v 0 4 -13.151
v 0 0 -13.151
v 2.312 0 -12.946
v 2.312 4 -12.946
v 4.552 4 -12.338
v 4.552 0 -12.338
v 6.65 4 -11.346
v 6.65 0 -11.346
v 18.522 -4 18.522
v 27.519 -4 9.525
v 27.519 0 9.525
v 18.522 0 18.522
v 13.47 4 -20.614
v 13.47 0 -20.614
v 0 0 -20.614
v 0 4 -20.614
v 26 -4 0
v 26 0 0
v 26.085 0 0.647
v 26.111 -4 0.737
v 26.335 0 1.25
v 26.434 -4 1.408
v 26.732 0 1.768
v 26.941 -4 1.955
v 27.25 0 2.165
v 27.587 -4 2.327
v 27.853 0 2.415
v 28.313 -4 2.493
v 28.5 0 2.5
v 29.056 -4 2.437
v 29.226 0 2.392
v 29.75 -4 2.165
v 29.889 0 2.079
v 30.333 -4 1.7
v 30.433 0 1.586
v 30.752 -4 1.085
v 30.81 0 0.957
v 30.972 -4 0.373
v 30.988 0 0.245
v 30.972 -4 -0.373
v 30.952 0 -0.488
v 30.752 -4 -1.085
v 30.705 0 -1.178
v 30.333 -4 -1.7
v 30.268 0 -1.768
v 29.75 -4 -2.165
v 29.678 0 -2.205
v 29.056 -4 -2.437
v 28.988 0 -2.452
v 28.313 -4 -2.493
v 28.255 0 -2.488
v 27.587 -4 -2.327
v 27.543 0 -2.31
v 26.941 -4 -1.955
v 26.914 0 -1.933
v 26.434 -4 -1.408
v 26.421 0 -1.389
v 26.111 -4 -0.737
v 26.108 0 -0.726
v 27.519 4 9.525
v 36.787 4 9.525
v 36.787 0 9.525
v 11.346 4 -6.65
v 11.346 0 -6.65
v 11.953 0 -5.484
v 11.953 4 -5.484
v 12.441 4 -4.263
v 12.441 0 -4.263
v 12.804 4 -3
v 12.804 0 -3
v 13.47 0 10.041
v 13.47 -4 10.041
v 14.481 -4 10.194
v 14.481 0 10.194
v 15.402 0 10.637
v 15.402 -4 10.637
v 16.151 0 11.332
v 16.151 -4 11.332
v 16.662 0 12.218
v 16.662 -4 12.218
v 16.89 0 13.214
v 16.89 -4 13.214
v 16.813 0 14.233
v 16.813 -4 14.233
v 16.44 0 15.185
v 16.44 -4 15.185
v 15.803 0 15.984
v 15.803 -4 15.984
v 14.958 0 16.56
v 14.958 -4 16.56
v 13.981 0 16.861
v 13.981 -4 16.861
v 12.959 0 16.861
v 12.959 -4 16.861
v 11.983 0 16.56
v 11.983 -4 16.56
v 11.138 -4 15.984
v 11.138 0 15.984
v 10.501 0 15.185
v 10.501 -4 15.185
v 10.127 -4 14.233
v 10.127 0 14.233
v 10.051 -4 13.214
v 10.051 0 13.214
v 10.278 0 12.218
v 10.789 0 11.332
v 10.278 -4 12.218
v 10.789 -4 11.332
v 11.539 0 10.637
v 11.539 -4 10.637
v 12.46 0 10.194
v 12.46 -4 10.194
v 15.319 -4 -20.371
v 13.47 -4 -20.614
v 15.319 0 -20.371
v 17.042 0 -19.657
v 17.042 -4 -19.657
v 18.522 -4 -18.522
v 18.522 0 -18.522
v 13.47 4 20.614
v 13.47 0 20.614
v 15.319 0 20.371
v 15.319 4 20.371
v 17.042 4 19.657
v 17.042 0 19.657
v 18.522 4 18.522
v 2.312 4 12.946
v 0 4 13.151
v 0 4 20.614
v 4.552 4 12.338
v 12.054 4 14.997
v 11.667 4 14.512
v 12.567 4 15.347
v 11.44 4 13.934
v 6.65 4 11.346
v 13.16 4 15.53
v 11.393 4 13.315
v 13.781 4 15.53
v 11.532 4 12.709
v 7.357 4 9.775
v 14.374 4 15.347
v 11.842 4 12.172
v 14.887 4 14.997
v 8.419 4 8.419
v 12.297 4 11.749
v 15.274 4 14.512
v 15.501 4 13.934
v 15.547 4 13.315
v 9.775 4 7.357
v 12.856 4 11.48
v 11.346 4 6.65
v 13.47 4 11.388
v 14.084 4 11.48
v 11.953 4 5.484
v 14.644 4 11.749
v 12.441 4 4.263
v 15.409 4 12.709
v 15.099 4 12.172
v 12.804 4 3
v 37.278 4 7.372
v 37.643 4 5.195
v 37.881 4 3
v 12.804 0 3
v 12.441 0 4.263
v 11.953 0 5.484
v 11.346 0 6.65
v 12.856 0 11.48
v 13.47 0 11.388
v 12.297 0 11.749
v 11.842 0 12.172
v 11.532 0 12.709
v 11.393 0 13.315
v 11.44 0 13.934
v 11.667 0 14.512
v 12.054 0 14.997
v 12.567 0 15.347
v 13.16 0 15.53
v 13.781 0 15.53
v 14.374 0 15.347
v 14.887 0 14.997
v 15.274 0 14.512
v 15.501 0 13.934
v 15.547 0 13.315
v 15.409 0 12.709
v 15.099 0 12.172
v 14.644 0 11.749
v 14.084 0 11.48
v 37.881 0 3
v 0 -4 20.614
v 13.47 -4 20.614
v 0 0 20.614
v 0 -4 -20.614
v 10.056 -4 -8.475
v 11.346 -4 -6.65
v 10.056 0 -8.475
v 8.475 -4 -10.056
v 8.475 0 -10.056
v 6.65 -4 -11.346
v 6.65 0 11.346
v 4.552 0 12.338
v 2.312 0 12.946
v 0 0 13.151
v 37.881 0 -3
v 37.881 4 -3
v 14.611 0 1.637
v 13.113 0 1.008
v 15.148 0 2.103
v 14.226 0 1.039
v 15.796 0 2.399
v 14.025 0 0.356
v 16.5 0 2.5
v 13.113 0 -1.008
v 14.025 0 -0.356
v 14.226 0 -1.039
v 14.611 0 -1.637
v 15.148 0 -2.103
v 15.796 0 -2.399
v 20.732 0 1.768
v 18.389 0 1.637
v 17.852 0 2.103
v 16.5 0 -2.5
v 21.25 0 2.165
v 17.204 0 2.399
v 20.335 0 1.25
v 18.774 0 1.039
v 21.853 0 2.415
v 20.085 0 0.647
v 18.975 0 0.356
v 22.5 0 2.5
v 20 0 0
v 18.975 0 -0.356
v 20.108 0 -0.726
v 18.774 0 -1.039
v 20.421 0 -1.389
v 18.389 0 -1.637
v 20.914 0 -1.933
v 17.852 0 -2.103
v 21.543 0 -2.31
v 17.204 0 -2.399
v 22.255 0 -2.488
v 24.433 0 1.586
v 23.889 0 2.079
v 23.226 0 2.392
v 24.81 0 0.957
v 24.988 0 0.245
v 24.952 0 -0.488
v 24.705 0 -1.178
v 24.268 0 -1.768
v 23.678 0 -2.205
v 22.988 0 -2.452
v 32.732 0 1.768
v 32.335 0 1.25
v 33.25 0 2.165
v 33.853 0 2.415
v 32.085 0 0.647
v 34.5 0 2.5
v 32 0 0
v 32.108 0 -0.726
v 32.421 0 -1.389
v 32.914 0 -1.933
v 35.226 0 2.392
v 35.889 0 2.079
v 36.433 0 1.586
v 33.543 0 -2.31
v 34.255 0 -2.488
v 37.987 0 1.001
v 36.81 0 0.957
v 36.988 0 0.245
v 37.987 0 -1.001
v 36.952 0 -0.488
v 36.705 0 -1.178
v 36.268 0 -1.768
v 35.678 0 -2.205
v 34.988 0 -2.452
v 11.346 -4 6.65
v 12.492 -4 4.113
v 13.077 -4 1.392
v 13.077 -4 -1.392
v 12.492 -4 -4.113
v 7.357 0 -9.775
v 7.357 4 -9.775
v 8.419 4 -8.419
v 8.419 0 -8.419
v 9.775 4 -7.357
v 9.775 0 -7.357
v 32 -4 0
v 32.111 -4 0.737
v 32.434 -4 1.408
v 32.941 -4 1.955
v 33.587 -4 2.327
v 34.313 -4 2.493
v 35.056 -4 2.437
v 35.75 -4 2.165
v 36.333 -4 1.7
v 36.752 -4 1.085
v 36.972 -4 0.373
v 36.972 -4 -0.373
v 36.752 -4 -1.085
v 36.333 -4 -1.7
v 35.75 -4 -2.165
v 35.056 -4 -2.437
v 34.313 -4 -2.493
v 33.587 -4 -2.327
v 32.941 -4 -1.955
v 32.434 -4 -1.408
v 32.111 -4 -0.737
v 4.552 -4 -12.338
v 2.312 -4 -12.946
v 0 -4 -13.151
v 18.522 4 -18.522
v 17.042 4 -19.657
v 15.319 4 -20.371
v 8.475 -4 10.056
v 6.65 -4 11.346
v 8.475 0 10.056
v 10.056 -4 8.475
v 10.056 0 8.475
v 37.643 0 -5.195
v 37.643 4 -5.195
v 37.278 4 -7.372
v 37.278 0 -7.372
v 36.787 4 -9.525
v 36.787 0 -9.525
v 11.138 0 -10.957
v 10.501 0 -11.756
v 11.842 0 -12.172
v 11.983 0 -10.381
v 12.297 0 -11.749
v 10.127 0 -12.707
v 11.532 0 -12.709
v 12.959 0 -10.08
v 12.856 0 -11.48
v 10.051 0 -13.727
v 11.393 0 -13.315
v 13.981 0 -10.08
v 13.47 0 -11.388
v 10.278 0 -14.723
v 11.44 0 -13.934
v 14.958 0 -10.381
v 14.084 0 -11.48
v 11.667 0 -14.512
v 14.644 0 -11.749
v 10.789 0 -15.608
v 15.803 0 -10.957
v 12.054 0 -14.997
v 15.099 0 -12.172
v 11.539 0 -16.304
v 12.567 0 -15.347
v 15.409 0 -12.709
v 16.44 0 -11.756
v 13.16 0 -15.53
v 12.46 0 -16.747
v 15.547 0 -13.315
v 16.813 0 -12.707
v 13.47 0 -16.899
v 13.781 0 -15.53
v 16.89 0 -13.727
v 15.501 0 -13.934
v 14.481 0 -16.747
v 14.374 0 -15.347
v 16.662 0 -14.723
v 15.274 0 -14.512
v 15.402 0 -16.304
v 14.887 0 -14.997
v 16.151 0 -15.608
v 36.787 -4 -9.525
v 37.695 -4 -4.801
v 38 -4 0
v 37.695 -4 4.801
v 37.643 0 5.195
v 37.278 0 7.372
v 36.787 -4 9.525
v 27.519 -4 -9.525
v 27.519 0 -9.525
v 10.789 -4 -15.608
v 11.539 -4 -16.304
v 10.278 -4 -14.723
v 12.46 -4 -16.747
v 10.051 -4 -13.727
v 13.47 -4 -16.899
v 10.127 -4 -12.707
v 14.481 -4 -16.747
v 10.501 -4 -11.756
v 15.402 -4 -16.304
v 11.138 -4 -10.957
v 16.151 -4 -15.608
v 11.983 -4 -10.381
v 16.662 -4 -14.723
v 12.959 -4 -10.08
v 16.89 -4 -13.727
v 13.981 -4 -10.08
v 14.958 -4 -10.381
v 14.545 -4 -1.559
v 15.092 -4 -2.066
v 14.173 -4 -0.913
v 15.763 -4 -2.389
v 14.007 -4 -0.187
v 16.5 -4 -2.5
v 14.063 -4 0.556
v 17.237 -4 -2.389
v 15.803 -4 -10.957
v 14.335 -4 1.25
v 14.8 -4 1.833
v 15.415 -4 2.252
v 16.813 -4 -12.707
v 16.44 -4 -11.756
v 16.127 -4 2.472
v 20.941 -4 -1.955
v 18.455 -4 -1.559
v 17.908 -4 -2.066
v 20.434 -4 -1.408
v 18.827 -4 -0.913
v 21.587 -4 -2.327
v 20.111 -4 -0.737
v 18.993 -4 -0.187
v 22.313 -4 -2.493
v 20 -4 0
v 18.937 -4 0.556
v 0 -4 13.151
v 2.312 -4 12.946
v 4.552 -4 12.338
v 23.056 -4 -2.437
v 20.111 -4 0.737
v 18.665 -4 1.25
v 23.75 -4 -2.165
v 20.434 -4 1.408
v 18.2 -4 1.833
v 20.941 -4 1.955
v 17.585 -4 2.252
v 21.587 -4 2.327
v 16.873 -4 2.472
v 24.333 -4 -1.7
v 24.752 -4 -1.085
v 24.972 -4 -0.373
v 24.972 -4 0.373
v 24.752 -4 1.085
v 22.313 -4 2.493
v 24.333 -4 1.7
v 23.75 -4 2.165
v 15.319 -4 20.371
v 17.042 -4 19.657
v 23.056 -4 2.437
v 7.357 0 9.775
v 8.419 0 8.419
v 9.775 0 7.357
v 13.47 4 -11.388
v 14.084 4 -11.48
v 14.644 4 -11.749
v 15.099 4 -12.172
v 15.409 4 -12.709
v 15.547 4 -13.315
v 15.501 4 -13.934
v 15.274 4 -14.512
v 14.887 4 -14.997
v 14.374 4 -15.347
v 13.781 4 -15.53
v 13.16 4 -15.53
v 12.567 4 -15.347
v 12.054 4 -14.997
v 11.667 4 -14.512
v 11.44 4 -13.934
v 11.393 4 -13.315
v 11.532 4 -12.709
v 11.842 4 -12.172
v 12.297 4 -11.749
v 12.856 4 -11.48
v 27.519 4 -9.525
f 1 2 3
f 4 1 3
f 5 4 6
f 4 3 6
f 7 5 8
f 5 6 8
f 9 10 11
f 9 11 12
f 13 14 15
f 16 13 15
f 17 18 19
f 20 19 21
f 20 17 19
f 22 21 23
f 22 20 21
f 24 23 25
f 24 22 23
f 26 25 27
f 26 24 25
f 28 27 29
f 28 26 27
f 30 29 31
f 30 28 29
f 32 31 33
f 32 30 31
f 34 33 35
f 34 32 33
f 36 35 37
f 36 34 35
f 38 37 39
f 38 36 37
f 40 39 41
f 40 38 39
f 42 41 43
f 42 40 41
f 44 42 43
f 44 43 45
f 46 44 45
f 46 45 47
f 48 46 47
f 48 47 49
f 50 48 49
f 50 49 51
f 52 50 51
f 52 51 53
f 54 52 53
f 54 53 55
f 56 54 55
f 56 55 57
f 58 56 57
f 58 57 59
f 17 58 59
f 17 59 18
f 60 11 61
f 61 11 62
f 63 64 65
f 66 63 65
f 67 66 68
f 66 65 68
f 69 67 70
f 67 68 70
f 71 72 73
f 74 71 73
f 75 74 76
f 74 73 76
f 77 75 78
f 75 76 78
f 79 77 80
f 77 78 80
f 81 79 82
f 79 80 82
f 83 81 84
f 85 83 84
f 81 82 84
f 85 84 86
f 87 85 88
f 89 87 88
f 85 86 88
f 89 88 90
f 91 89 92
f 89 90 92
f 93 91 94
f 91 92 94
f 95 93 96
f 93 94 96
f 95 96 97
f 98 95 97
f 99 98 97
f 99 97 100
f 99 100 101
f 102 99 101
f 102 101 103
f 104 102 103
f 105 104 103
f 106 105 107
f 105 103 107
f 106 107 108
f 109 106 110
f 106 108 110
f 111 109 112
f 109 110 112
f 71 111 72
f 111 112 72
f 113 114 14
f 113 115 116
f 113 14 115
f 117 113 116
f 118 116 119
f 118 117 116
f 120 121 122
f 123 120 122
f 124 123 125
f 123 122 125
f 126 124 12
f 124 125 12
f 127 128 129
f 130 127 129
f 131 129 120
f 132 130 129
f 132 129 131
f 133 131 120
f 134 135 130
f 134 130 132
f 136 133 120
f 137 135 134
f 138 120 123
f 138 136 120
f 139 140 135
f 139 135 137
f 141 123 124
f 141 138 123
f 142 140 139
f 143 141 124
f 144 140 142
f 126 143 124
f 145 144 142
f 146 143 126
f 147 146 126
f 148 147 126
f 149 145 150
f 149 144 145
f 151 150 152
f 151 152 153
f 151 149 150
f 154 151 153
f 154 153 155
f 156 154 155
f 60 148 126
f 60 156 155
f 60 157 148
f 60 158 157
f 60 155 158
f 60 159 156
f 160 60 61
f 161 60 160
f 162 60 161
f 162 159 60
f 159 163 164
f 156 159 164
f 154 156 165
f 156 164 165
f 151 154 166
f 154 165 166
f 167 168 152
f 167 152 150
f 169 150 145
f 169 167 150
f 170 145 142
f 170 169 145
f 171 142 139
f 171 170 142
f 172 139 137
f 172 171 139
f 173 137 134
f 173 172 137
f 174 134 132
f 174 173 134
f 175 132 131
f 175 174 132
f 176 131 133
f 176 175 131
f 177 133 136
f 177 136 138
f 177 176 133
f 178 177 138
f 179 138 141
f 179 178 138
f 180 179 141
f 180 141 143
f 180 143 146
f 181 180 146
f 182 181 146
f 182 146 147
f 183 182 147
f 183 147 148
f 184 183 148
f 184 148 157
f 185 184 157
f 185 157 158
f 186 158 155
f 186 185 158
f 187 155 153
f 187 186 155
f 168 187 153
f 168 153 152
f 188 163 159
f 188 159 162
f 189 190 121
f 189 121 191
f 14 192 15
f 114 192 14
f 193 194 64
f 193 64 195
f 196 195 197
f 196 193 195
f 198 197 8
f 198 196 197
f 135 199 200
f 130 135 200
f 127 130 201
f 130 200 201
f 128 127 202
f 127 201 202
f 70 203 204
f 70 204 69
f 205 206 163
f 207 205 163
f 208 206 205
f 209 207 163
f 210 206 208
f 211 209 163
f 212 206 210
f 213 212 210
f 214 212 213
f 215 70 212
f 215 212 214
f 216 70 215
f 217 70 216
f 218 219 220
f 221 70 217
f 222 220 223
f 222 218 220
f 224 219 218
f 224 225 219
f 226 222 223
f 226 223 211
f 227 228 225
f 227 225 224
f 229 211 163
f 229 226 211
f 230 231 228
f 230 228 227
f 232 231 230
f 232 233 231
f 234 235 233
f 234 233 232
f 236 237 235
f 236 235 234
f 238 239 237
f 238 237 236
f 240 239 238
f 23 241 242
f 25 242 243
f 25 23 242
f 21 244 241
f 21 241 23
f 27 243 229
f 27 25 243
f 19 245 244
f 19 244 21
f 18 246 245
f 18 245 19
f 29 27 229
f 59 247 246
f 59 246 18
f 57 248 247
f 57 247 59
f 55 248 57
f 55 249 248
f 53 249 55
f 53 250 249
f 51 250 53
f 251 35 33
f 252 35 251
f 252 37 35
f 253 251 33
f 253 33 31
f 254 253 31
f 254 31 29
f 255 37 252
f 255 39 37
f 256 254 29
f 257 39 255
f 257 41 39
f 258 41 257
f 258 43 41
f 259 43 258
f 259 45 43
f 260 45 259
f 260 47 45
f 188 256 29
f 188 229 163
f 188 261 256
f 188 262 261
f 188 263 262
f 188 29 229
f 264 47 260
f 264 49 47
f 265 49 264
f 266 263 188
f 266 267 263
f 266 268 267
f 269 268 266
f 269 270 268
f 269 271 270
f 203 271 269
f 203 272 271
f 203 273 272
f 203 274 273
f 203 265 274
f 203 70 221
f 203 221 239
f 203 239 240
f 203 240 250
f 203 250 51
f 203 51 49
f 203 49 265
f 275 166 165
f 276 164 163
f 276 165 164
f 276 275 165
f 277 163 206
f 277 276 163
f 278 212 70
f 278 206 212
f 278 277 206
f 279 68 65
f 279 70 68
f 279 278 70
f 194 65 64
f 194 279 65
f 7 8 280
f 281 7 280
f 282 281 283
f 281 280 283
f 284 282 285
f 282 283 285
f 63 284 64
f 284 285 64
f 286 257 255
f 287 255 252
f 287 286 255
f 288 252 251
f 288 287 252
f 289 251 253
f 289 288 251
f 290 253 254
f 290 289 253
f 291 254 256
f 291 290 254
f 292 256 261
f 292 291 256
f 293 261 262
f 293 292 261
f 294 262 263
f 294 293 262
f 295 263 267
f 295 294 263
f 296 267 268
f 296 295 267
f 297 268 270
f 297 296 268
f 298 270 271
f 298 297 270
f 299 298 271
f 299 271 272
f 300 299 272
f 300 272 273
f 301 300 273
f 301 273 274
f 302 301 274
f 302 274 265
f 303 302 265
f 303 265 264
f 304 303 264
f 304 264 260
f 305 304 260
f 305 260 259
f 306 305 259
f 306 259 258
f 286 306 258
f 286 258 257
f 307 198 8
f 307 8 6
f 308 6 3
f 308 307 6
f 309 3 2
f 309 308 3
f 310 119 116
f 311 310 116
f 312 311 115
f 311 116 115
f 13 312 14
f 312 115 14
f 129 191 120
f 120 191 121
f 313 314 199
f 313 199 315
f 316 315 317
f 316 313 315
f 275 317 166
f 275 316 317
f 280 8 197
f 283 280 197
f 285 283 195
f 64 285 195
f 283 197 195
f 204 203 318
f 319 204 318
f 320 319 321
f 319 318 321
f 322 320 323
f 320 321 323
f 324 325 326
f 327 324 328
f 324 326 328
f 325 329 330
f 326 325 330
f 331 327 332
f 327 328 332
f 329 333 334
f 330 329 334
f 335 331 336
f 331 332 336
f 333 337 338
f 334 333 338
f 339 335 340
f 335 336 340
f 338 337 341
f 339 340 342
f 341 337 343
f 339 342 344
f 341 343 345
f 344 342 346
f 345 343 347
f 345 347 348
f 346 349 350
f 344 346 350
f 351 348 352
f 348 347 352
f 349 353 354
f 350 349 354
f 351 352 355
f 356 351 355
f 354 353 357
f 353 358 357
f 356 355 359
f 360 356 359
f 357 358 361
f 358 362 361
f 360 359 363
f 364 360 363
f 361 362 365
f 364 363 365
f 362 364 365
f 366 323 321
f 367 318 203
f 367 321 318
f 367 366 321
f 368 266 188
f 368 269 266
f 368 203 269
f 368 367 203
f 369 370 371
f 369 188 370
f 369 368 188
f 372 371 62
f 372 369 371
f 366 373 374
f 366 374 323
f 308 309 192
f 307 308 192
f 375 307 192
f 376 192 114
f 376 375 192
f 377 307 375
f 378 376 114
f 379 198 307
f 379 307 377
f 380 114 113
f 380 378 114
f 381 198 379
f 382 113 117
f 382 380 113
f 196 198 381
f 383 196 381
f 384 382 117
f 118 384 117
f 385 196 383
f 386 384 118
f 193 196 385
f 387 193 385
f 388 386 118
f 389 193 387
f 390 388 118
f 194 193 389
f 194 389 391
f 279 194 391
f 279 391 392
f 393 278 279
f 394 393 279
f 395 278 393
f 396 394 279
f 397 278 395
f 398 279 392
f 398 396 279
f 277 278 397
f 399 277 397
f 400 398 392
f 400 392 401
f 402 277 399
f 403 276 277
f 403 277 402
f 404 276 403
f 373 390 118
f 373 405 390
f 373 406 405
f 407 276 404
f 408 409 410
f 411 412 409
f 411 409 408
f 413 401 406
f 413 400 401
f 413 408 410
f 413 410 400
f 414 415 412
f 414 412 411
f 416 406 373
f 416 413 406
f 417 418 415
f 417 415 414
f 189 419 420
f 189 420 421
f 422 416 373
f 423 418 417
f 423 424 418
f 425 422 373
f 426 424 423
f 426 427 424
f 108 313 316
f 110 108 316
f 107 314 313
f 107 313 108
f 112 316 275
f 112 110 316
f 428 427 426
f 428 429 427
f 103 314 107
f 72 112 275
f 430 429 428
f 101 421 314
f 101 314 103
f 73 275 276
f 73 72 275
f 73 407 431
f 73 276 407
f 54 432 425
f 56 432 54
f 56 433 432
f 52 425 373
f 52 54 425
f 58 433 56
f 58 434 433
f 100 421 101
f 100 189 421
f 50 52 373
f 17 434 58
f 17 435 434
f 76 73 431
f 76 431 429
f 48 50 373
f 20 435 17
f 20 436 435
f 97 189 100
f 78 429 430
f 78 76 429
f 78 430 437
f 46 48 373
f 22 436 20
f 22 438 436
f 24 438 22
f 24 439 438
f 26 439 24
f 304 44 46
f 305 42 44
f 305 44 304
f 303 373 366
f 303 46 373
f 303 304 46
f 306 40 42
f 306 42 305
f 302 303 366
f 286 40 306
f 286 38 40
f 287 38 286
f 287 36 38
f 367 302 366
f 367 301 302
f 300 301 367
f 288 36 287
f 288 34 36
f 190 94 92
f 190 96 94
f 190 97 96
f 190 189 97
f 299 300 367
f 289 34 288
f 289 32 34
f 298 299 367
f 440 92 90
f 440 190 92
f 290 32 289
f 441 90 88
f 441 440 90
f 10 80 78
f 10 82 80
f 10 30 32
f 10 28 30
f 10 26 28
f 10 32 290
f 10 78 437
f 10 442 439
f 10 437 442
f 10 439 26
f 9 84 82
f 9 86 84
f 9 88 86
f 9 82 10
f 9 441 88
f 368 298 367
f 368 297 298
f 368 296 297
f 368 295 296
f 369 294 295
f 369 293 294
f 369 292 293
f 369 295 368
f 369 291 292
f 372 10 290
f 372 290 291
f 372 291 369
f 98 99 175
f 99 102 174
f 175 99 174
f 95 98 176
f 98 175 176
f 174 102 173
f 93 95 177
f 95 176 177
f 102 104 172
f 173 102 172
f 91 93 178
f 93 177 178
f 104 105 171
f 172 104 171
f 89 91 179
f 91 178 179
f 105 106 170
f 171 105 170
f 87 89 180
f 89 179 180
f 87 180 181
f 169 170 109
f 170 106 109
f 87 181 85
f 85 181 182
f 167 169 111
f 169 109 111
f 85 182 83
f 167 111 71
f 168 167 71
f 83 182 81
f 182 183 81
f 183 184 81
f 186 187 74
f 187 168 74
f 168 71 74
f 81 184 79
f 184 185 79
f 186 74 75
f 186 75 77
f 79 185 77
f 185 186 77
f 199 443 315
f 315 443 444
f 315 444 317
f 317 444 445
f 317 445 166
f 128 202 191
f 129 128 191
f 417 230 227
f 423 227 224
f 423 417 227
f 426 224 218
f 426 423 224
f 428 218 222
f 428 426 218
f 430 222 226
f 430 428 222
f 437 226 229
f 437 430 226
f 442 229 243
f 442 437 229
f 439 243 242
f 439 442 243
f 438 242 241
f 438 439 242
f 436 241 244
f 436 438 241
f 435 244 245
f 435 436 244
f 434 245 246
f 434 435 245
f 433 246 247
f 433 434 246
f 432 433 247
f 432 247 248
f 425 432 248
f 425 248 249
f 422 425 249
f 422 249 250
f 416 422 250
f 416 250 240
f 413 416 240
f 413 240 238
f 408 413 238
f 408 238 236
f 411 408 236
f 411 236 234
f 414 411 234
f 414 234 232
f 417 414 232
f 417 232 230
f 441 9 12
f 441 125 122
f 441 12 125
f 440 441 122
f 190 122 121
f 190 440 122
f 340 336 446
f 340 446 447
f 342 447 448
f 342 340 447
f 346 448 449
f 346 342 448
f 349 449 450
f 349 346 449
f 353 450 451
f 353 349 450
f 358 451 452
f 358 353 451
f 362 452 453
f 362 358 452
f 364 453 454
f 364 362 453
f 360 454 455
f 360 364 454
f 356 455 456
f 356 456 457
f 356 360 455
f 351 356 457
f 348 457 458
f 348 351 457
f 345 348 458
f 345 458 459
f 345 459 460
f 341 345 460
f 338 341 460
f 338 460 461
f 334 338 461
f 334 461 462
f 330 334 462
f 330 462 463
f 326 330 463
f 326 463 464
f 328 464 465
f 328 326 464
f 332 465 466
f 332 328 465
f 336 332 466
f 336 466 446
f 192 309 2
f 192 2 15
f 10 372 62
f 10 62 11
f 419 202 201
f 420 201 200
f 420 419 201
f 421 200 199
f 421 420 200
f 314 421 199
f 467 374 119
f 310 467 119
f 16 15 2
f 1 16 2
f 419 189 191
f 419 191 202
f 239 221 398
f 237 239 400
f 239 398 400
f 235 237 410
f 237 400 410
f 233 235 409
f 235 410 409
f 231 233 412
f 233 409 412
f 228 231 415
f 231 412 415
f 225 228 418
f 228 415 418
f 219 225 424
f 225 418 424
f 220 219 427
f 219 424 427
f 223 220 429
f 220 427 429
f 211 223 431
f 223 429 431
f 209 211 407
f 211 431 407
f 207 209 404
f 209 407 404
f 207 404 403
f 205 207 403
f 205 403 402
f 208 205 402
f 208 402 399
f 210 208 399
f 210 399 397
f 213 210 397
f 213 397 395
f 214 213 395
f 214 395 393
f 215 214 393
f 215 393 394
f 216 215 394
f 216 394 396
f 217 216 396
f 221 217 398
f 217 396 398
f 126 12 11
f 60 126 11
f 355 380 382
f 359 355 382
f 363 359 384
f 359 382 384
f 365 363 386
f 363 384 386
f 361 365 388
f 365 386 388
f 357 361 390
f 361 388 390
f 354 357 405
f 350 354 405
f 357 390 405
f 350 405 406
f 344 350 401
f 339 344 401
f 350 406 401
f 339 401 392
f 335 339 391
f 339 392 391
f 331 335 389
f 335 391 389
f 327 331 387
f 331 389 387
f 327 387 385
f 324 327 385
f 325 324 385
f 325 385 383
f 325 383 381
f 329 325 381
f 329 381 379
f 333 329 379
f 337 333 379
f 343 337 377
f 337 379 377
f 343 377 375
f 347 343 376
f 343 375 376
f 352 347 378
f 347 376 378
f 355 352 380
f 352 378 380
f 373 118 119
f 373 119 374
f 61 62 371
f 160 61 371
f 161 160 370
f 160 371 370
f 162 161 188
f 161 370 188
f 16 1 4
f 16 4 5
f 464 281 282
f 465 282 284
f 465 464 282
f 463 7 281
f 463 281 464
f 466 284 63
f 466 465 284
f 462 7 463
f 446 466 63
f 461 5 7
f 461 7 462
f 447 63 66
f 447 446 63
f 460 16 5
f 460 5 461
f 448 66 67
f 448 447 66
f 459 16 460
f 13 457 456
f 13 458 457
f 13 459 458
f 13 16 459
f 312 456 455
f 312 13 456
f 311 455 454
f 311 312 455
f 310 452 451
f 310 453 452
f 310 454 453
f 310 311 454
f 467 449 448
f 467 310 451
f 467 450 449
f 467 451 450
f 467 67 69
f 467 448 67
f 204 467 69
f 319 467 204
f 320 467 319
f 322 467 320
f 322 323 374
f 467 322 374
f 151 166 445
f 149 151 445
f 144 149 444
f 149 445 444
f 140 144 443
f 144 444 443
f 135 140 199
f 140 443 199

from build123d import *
from build123d.topology import SkipClean

# Parameters (mm, degrees)
SKETCH1_R           = 2.0828
SKETCH1_R_2         = 2.5
BOSS_EXTRUDE2_DEPTH = 4
BOSS_EXTRUDE3_START = 4
SKETCH5_R           = 3.429
SKETCH5_R_2         = 2.5
BOSS_EXTRUDE3_DEPTH = 4
CUT_EXTRUDE2_START  = -4
CUT_EXTRUDE2_DEPTH  = 4


with BuildPart() as part:
    # Sketch1 → Boss-Extrude2 (new body)
    with BuildSketch(Plane(origin=(0, 0, 0), x_dir=(1, 0, 0), z_dir=(0, 1, 0))):
        with BuildLine():
            Line((0, 20.614134159), (0, 13.151202806))
            ThreePointArc((0, 13.151202806), (3.445207277, 12.691914043), (6.64977573, 11.346127885))
            ThreePointArc((6.64977573, 11.346127885), (8.418990091, 8.418990091), (11.346127885, 6.64977573))
            ThreePointArc((11.346127885, 6.64977573), (13.151202806, 0), (11.346127885, -6.64977573))
            ThreePointArc((11.346127885, -6.64977573), (8.418990091, -8.418990091), (6.64977573, -11.346127885))
            ThreePointArc((6.64977573, -11.346127885), (3.445207277, -12.691914043), (0, -13.151202806))
            Line((0, -13.151202806), (0, -20.614134159))
            Line((0, -20.614134159), (13.470384159, -20.614134159))
            ThreePointArc((13.470384159, -20.614134159), (16.204178929, -20.070348569), (18.521778227, -18.521778227))
            Line((18.521778227, -18.521778227), (27.518556454, -9.525))
            Line((27.518556454, -9.525), (36.786877756, -9.525))
            ThreePointArc((36.786877756, -9.525), (38, 0), (36.786877756, 9.525))
            Line((36.786877756, 9.525), (27.518556454, 9.525))
            Line((27.518556454, 9.525), (18.521778227, 18.521778227))
            ThreePointArc((18.521778227, 18.521778227), (16.204178929, 20.070348569), (13.470384159, 20.614134159))
            Line((13.470384159, 20.614134159), (0, 20.614134159))
        make_face()
        with Locations((13.470384159, 13.470384159)):
            Circle(SKETCH1_R, mode=Mode.SUBTRACT)
        with Locations((13.470384159, -13.470384159)):
            Circle(SKETCH1_R, mode=Mode.SUBTRACT)
        with Locations((16.5, 0)):
            Circle(SKETCH1_R_2, mode=Mode.SUBTRACT)
        with Locations((22.5, 0)):
            Circle(SKETCH1_R_2, mode=Mode.SUBTRACT)
        with Locations((28.5, 0)):
            Circle(SKETCH1_R_2, mode=Mode.SUBTRACT)
        with Locations((34.5, 0)):
            Circle(SKETCH1_R_2, mode=Mode.SUBTRACT)
    extrude(amount=BOSS_EXTRUDE2_DEPTH)

    # Sketch5 → Boss-Extrude3 (add)
    with SkipClean():  # the faces are left unmerged after this step: merging them gives an invalid solid
        with BuildSketch(Plane.XZ.offset(BOSS_EXTRUDE3_START)):
            with BuildLine():
                ThreePointArc((36.786877756, -9.525), (38, 0), (36.786877756, 9.525))
                Line((36.786877756, 9.525), (27.518556454, 9.525))
                Line((27.518556454, 9.525), (18.521778227, 18.521778227))
                ThreePointArc((18.521778227, 18.521778227), (16.204178929, 20.070348569), (13.470384159, 20.614134159))
                Line((13.470384159, 20.614134159), (0, 20.614134159))
                Line((0, 20.614134159), (0, 13.151202806))
                ThreePointArc((0, 13.151202806), (3.445207277, 12.691914043), (6.64977573, 11.346127885))
                ThreePointArc((6.64977573, 11.346127885), (9.299304685, 9.299304685), (11.346127885, 6.64977573))
                ThreePointArc((11.346127885, 6.64977573), (13.151202806, 0), (11.346127885, -6.64977573))
                ThreePointArc((11.346127885, -6.64977573), (9.299304685, -9.299304685), (6.64977573, -11.346127885))
                ThreePointArc((6.64977573, -11.346127885), (3.445207277, -12.691914043), (0, -13.151202806))
                Line((0, -13.151202806), (0, -20.614134159))
                Line((0, -20.614134159), (13.470384159, -20.614134159))
                ThreePointArc((13.470384159, -20.614134159), (16.204178929, -20.070348569), (18.521778227, -18.521778227))
                Line((18.521778227, -18.521778227), (27.518556454, -9.525))
                Line((27.518556454, -9.525), (36.786877756, -9.525))
            make_face()
            with Locations((13.470384159, -13.470384159)):
                Circle(SKETCH5_R, mode=Mode.SUBTRACT)
            with Locations((16.5, 0)):
                Circle(SKETCH5_R_2, mode=Mode.SUBTRACT)
            with Locations((13.470384159, 13.470384159)):
                Circle(SKETCH5_R, mode=Mode.SUBTRACT)
            with BuildLine():
                ThreePointArc((25, 0), (22.5, -2.5), (20, 0))
                ThreePointArc((20, 0), (22.5, 2.5), (25, 0))
            make_face(mode=Mode.SUBTRACT)
            with BuildLine():
                ThreePointArc((31, 0), (28.5, -2.5), (26, 0))
                ThreePointArc((26, 0), (28.5, 2.5), (31, 0))
            make_face(mode=Mode.SUBTRACT)
            with BuildLine():
                ThreePointArc((37, 0), (34.5, -2.5), (32, 0))
                ThreePointArc((32, 0), (34.5, 2.5), (37, 0))
            make_face(mode=Mode.SUBTRACT)
        extrude(amount=-BOSS_EXTRUDE3_DEPTH)

    # Sketch6 → Cut-Extrude2 (cut)
    with SkipClean():  # the faces are left unmerged after this step: merging them gives an invalid solid
        with BuildSketch(Plane(origin=(0, 4, 0), x_dir=(1, 0, 0), z_dir=(0, 1, 0)).offset(CUT_EXTRUDE2_START)):
            with BuildLine():
                Line((12.804457632, -3), (37.88139385, -3))
                ThreePointArc((37.88139385, -3), (38, 0), (37.88139385, 3))
                Line((37.88139385, 3), (12.804457632, 3))
                ThreePointArc((12.804457632, 3), (13.151202806, 0), (12.804457632, -3))
            make_face()
        extrude(amount=CUT_EXTRUDE2_DEPTH, mode=Mode.SUBTRACT)


solid = part.part
